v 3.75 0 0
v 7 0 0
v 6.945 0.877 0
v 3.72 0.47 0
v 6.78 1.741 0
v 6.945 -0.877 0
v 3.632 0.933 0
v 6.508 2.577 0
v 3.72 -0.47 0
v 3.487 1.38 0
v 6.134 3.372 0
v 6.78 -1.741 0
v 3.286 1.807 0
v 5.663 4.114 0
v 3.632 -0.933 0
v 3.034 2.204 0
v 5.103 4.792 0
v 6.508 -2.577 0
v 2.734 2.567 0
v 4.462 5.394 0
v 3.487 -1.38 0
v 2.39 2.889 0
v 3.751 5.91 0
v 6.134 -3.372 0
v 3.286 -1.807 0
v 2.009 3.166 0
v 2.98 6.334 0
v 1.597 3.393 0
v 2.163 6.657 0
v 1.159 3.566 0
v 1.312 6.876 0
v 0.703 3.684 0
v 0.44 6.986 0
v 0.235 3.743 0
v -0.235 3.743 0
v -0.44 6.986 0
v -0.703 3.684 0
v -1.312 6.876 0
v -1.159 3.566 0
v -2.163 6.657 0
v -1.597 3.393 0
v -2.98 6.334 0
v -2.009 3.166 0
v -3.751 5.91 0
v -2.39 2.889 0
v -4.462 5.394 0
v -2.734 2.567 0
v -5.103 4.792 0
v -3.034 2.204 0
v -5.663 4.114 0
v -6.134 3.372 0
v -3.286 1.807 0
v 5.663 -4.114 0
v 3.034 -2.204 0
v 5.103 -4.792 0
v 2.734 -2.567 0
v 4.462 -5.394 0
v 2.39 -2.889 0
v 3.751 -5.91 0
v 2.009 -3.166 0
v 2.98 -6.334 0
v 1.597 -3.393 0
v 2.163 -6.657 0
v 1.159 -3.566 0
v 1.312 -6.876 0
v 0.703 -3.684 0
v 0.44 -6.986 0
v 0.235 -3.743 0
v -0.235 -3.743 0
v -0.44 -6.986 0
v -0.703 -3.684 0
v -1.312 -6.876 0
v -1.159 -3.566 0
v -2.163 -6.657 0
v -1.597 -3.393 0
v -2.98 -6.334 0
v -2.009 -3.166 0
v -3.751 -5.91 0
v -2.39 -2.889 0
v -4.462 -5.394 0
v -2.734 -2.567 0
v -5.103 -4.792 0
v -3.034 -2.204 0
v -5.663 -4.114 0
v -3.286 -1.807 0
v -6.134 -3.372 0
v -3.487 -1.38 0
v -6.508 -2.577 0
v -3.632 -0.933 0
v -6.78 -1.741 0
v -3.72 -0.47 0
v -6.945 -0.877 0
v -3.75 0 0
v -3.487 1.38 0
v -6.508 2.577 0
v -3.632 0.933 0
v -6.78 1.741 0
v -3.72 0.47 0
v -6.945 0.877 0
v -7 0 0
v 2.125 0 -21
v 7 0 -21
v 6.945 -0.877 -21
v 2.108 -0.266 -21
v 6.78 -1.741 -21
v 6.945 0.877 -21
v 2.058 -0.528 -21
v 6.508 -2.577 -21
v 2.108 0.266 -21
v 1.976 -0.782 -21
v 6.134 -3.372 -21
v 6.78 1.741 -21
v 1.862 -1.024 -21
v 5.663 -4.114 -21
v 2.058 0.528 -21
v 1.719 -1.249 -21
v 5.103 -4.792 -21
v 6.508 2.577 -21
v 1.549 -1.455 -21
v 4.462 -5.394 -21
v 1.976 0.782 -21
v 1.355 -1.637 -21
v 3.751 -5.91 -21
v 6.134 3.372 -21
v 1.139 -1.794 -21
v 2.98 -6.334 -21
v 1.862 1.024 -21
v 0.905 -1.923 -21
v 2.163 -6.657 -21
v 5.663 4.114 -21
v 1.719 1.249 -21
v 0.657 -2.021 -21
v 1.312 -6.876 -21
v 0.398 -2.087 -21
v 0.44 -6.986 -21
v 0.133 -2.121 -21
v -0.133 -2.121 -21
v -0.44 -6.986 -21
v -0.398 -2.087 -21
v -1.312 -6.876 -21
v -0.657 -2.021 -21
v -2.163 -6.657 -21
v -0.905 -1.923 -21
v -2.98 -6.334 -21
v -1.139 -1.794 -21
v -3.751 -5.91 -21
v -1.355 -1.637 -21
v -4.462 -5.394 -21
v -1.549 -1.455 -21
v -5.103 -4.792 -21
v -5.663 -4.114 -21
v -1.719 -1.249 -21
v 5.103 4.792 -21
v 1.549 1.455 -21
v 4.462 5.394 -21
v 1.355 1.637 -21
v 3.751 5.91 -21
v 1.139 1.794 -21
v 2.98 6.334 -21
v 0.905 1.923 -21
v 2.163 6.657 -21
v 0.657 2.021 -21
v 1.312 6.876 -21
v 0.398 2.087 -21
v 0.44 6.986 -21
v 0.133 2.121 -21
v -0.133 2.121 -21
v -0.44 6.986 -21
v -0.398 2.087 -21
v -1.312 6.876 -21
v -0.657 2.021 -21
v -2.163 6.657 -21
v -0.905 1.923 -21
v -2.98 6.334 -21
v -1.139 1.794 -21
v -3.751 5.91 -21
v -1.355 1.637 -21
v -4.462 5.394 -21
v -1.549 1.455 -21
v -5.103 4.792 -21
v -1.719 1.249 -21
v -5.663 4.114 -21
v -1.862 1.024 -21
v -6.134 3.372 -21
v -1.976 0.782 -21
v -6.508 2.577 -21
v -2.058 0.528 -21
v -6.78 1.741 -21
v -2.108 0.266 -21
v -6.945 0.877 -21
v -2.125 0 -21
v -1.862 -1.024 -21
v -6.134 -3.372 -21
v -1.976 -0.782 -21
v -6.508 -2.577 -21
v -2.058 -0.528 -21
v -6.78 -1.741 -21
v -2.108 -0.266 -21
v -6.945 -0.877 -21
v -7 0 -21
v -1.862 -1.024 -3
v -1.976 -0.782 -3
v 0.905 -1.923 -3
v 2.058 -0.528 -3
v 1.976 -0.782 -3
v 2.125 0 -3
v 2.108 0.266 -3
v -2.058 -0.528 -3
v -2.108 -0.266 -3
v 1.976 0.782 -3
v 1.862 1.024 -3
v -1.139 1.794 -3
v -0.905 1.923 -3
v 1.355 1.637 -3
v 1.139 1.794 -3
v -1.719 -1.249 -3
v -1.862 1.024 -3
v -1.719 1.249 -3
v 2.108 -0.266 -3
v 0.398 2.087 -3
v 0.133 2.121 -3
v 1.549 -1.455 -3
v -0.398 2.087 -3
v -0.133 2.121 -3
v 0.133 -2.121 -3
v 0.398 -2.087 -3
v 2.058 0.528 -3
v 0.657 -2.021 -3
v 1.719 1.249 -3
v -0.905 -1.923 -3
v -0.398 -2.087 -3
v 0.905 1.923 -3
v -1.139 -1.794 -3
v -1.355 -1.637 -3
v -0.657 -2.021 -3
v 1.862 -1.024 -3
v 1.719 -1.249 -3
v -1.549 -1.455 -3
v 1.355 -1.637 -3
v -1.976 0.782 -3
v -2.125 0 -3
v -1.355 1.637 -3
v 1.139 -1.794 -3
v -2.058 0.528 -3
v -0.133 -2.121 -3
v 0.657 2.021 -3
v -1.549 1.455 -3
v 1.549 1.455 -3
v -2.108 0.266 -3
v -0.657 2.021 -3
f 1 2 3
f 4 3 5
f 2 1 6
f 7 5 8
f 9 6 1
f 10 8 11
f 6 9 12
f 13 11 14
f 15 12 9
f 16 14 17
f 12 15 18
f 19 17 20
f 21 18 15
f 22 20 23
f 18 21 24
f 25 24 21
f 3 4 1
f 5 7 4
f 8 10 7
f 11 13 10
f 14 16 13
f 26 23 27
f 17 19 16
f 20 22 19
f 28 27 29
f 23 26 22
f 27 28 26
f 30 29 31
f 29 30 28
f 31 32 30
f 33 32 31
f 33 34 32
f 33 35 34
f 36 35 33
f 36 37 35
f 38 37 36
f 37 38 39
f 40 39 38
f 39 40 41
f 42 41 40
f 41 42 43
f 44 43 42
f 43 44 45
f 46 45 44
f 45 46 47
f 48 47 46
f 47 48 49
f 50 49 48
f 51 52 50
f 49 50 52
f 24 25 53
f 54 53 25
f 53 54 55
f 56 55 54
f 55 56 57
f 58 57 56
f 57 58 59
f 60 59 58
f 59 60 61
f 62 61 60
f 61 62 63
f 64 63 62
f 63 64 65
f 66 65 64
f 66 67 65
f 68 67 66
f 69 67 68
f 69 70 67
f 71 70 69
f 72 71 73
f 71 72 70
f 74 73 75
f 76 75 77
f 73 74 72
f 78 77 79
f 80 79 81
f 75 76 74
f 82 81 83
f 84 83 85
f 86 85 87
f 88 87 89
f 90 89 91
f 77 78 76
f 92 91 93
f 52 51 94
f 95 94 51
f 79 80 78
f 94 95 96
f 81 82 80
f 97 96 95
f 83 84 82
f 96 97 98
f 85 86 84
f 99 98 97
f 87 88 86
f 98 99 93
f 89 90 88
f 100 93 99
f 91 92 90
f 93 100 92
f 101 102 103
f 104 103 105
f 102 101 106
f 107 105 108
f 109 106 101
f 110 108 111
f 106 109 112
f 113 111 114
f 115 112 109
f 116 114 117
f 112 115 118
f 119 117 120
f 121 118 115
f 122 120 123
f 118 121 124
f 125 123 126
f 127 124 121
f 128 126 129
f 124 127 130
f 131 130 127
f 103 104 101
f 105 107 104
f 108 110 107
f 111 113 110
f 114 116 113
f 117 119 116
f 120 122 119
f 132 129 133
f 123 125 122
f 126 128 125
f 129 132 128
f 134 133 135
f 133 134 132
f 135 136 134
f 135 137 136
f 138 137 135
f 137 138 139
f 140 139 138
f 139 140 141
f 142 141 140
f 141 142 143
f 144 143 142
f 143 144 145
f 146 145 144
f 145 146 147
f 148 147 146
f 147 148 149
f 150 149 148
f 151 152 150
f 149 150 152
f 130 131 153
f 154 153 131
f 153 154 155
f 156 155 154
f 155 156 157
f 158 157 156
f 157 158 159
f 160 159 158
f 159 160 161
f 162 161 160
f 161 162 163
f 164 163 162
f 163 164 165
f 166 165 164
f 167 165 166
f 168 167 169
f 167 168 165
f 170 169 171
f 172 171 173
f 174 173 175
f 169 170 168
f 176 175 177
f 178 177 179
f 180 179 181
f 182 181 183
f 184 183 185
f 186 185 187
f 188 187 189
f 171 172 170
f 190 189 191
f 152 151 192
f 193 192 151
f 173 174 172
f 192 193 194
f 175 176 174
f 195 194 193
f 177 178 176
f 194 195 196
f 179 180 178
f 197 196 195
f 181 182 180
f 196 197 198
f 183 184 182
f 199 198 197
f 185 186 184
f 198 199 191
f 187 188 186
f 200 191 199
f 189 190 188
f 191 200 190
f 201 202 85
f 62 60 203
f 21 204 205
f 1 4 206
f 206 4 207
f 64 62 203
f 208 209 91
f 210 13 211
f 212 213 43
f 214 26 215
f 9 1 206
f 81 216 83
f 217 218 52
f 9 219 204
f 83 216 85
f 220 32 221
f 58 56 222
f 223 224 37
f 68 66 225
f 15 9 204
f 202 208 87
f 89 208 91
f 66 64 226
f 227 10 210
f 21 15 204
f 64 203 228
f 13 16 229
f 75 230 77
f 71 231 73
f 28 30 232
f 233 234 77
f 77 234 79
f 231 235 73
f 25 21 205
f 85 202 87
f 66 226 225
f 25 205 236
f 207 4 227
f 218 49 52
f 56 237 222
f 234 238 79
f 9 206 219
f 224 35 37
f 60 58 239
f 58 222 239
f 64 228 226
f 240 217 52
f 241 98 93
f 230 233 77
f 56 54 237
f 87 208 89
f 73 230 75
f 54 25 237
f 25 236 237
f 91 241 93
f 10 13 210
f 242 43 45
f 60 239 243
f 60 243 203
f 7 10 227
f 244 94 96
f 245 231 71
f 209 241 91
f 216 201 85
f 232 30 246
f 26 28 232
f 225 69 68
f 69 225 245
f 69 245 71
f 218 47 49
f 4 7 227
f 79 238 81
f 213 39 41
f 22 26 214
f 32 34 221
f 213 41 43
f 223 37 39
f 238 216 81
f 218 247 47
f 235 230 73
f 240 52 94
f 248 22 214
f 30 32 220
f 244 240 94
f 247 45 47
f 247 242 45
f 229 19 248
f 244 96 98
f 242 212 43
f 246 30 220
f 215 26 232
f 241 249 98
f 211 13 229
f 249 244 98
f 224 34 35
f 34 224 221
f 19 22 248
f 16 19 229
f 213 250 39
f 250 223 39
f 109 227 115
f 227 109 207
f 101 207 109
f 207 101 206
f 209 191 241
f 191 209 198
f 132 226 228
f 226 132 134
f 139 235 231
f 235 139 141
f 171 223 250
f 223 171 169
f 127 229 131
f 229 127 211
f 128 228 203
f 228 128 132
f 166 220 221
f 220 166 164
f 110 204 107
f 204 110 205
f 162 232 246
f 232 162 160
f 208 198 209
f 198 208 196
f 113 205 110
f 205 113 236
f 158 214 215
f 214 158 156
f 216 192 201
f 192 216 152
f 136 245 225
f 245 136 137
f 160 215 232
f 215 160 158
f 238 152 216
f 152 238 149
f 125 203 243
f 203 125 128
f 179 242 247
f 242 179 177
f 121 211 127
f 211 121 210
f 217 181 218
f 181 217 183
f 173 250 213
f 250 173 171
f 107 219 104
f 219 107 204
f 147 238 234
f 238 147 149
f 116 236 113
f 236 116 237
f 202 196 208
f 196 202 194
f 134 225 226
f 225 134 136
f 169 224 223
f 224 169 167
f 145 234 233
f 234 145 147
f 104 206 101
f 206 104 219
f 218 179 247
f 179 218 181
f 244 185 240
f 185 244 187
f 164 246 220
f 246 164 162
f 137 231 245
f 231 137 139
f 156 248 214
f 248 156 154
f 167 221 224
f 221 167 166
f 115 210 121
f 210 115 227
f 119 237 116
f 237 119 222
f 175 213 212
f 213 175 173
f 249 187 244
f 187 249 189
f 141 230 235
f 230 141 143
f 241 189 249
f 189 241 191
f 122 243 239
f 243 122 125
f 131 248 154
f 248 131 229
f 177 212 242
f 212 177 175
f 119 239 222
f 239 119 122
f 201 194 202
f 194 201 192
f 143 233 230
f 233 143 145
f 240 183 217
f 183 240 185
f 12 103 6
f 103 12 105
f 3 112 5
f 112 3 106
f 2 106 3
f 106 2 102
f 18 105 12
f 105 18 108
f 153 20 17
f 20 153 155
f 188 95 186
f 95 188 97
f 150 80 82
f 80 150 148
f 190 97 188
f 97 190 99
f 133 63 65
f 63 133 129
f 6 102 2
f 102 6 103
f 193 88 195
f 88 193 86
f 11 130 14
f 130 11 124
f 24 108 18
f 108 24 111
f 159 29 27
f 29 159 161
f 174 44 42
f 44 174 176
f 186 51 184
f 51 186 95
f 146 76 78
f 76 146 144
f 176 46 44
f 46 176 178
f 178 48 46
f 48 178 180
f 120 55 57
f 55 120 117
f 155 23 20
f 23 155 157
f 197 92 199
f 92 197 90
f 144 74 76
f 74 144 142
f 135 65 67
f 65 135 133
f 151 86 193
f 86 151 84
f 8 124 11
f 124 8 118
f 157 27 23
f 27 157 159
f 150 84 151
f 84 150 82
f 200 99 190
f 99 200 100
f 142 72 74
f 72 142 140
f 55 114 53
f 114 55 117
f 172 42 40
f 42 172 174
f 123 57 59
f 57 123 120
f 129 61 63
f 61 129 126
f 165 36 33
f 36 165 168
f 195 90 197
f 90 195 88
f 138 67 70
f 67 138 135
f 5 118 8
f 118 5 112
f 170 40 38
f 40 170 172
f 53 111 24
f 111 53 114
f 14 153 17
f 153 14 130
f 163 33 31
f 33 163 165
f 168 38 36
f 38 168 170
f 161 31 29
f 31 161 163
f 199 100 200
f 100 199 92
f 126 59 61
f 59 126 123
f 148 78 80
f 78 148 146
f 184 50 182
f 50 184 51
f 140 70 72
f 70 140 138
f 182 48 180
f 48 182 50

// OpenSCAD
$fn = 50;


difference() {
	union() {
		translate(v = [0, 0, -21.0000000000]) {
			cylinder(h = 21, r = 7.0000000000);
		}
	}
	union() {
		translate(v = [0, 0, 0]) {
			rotate(a = [0, 0, 0]) {
				difference() {
					union() {
						#translate(v = [0, 0, -21.0000000000]) {
							cylinder(h = 21, r = 2.0000000000);
						}
						#translate(v = [0, 0, -3]) {
							cylinder(h = 3, r = 7.0000000000, r1 = 2.1250000000, r2 = 3.7500000000);
						}
						#translate(v = [0, 0, -21.0000000000]) {
							cylinder(h = 21, r = 2.1250000000);
						}
						#translate(v = [0, 0, -21.0000000000]) {
							cylinder(h = 21, r = 2.0000000000);
						}
					}
					union();
				}
			}
		}
	}
}
